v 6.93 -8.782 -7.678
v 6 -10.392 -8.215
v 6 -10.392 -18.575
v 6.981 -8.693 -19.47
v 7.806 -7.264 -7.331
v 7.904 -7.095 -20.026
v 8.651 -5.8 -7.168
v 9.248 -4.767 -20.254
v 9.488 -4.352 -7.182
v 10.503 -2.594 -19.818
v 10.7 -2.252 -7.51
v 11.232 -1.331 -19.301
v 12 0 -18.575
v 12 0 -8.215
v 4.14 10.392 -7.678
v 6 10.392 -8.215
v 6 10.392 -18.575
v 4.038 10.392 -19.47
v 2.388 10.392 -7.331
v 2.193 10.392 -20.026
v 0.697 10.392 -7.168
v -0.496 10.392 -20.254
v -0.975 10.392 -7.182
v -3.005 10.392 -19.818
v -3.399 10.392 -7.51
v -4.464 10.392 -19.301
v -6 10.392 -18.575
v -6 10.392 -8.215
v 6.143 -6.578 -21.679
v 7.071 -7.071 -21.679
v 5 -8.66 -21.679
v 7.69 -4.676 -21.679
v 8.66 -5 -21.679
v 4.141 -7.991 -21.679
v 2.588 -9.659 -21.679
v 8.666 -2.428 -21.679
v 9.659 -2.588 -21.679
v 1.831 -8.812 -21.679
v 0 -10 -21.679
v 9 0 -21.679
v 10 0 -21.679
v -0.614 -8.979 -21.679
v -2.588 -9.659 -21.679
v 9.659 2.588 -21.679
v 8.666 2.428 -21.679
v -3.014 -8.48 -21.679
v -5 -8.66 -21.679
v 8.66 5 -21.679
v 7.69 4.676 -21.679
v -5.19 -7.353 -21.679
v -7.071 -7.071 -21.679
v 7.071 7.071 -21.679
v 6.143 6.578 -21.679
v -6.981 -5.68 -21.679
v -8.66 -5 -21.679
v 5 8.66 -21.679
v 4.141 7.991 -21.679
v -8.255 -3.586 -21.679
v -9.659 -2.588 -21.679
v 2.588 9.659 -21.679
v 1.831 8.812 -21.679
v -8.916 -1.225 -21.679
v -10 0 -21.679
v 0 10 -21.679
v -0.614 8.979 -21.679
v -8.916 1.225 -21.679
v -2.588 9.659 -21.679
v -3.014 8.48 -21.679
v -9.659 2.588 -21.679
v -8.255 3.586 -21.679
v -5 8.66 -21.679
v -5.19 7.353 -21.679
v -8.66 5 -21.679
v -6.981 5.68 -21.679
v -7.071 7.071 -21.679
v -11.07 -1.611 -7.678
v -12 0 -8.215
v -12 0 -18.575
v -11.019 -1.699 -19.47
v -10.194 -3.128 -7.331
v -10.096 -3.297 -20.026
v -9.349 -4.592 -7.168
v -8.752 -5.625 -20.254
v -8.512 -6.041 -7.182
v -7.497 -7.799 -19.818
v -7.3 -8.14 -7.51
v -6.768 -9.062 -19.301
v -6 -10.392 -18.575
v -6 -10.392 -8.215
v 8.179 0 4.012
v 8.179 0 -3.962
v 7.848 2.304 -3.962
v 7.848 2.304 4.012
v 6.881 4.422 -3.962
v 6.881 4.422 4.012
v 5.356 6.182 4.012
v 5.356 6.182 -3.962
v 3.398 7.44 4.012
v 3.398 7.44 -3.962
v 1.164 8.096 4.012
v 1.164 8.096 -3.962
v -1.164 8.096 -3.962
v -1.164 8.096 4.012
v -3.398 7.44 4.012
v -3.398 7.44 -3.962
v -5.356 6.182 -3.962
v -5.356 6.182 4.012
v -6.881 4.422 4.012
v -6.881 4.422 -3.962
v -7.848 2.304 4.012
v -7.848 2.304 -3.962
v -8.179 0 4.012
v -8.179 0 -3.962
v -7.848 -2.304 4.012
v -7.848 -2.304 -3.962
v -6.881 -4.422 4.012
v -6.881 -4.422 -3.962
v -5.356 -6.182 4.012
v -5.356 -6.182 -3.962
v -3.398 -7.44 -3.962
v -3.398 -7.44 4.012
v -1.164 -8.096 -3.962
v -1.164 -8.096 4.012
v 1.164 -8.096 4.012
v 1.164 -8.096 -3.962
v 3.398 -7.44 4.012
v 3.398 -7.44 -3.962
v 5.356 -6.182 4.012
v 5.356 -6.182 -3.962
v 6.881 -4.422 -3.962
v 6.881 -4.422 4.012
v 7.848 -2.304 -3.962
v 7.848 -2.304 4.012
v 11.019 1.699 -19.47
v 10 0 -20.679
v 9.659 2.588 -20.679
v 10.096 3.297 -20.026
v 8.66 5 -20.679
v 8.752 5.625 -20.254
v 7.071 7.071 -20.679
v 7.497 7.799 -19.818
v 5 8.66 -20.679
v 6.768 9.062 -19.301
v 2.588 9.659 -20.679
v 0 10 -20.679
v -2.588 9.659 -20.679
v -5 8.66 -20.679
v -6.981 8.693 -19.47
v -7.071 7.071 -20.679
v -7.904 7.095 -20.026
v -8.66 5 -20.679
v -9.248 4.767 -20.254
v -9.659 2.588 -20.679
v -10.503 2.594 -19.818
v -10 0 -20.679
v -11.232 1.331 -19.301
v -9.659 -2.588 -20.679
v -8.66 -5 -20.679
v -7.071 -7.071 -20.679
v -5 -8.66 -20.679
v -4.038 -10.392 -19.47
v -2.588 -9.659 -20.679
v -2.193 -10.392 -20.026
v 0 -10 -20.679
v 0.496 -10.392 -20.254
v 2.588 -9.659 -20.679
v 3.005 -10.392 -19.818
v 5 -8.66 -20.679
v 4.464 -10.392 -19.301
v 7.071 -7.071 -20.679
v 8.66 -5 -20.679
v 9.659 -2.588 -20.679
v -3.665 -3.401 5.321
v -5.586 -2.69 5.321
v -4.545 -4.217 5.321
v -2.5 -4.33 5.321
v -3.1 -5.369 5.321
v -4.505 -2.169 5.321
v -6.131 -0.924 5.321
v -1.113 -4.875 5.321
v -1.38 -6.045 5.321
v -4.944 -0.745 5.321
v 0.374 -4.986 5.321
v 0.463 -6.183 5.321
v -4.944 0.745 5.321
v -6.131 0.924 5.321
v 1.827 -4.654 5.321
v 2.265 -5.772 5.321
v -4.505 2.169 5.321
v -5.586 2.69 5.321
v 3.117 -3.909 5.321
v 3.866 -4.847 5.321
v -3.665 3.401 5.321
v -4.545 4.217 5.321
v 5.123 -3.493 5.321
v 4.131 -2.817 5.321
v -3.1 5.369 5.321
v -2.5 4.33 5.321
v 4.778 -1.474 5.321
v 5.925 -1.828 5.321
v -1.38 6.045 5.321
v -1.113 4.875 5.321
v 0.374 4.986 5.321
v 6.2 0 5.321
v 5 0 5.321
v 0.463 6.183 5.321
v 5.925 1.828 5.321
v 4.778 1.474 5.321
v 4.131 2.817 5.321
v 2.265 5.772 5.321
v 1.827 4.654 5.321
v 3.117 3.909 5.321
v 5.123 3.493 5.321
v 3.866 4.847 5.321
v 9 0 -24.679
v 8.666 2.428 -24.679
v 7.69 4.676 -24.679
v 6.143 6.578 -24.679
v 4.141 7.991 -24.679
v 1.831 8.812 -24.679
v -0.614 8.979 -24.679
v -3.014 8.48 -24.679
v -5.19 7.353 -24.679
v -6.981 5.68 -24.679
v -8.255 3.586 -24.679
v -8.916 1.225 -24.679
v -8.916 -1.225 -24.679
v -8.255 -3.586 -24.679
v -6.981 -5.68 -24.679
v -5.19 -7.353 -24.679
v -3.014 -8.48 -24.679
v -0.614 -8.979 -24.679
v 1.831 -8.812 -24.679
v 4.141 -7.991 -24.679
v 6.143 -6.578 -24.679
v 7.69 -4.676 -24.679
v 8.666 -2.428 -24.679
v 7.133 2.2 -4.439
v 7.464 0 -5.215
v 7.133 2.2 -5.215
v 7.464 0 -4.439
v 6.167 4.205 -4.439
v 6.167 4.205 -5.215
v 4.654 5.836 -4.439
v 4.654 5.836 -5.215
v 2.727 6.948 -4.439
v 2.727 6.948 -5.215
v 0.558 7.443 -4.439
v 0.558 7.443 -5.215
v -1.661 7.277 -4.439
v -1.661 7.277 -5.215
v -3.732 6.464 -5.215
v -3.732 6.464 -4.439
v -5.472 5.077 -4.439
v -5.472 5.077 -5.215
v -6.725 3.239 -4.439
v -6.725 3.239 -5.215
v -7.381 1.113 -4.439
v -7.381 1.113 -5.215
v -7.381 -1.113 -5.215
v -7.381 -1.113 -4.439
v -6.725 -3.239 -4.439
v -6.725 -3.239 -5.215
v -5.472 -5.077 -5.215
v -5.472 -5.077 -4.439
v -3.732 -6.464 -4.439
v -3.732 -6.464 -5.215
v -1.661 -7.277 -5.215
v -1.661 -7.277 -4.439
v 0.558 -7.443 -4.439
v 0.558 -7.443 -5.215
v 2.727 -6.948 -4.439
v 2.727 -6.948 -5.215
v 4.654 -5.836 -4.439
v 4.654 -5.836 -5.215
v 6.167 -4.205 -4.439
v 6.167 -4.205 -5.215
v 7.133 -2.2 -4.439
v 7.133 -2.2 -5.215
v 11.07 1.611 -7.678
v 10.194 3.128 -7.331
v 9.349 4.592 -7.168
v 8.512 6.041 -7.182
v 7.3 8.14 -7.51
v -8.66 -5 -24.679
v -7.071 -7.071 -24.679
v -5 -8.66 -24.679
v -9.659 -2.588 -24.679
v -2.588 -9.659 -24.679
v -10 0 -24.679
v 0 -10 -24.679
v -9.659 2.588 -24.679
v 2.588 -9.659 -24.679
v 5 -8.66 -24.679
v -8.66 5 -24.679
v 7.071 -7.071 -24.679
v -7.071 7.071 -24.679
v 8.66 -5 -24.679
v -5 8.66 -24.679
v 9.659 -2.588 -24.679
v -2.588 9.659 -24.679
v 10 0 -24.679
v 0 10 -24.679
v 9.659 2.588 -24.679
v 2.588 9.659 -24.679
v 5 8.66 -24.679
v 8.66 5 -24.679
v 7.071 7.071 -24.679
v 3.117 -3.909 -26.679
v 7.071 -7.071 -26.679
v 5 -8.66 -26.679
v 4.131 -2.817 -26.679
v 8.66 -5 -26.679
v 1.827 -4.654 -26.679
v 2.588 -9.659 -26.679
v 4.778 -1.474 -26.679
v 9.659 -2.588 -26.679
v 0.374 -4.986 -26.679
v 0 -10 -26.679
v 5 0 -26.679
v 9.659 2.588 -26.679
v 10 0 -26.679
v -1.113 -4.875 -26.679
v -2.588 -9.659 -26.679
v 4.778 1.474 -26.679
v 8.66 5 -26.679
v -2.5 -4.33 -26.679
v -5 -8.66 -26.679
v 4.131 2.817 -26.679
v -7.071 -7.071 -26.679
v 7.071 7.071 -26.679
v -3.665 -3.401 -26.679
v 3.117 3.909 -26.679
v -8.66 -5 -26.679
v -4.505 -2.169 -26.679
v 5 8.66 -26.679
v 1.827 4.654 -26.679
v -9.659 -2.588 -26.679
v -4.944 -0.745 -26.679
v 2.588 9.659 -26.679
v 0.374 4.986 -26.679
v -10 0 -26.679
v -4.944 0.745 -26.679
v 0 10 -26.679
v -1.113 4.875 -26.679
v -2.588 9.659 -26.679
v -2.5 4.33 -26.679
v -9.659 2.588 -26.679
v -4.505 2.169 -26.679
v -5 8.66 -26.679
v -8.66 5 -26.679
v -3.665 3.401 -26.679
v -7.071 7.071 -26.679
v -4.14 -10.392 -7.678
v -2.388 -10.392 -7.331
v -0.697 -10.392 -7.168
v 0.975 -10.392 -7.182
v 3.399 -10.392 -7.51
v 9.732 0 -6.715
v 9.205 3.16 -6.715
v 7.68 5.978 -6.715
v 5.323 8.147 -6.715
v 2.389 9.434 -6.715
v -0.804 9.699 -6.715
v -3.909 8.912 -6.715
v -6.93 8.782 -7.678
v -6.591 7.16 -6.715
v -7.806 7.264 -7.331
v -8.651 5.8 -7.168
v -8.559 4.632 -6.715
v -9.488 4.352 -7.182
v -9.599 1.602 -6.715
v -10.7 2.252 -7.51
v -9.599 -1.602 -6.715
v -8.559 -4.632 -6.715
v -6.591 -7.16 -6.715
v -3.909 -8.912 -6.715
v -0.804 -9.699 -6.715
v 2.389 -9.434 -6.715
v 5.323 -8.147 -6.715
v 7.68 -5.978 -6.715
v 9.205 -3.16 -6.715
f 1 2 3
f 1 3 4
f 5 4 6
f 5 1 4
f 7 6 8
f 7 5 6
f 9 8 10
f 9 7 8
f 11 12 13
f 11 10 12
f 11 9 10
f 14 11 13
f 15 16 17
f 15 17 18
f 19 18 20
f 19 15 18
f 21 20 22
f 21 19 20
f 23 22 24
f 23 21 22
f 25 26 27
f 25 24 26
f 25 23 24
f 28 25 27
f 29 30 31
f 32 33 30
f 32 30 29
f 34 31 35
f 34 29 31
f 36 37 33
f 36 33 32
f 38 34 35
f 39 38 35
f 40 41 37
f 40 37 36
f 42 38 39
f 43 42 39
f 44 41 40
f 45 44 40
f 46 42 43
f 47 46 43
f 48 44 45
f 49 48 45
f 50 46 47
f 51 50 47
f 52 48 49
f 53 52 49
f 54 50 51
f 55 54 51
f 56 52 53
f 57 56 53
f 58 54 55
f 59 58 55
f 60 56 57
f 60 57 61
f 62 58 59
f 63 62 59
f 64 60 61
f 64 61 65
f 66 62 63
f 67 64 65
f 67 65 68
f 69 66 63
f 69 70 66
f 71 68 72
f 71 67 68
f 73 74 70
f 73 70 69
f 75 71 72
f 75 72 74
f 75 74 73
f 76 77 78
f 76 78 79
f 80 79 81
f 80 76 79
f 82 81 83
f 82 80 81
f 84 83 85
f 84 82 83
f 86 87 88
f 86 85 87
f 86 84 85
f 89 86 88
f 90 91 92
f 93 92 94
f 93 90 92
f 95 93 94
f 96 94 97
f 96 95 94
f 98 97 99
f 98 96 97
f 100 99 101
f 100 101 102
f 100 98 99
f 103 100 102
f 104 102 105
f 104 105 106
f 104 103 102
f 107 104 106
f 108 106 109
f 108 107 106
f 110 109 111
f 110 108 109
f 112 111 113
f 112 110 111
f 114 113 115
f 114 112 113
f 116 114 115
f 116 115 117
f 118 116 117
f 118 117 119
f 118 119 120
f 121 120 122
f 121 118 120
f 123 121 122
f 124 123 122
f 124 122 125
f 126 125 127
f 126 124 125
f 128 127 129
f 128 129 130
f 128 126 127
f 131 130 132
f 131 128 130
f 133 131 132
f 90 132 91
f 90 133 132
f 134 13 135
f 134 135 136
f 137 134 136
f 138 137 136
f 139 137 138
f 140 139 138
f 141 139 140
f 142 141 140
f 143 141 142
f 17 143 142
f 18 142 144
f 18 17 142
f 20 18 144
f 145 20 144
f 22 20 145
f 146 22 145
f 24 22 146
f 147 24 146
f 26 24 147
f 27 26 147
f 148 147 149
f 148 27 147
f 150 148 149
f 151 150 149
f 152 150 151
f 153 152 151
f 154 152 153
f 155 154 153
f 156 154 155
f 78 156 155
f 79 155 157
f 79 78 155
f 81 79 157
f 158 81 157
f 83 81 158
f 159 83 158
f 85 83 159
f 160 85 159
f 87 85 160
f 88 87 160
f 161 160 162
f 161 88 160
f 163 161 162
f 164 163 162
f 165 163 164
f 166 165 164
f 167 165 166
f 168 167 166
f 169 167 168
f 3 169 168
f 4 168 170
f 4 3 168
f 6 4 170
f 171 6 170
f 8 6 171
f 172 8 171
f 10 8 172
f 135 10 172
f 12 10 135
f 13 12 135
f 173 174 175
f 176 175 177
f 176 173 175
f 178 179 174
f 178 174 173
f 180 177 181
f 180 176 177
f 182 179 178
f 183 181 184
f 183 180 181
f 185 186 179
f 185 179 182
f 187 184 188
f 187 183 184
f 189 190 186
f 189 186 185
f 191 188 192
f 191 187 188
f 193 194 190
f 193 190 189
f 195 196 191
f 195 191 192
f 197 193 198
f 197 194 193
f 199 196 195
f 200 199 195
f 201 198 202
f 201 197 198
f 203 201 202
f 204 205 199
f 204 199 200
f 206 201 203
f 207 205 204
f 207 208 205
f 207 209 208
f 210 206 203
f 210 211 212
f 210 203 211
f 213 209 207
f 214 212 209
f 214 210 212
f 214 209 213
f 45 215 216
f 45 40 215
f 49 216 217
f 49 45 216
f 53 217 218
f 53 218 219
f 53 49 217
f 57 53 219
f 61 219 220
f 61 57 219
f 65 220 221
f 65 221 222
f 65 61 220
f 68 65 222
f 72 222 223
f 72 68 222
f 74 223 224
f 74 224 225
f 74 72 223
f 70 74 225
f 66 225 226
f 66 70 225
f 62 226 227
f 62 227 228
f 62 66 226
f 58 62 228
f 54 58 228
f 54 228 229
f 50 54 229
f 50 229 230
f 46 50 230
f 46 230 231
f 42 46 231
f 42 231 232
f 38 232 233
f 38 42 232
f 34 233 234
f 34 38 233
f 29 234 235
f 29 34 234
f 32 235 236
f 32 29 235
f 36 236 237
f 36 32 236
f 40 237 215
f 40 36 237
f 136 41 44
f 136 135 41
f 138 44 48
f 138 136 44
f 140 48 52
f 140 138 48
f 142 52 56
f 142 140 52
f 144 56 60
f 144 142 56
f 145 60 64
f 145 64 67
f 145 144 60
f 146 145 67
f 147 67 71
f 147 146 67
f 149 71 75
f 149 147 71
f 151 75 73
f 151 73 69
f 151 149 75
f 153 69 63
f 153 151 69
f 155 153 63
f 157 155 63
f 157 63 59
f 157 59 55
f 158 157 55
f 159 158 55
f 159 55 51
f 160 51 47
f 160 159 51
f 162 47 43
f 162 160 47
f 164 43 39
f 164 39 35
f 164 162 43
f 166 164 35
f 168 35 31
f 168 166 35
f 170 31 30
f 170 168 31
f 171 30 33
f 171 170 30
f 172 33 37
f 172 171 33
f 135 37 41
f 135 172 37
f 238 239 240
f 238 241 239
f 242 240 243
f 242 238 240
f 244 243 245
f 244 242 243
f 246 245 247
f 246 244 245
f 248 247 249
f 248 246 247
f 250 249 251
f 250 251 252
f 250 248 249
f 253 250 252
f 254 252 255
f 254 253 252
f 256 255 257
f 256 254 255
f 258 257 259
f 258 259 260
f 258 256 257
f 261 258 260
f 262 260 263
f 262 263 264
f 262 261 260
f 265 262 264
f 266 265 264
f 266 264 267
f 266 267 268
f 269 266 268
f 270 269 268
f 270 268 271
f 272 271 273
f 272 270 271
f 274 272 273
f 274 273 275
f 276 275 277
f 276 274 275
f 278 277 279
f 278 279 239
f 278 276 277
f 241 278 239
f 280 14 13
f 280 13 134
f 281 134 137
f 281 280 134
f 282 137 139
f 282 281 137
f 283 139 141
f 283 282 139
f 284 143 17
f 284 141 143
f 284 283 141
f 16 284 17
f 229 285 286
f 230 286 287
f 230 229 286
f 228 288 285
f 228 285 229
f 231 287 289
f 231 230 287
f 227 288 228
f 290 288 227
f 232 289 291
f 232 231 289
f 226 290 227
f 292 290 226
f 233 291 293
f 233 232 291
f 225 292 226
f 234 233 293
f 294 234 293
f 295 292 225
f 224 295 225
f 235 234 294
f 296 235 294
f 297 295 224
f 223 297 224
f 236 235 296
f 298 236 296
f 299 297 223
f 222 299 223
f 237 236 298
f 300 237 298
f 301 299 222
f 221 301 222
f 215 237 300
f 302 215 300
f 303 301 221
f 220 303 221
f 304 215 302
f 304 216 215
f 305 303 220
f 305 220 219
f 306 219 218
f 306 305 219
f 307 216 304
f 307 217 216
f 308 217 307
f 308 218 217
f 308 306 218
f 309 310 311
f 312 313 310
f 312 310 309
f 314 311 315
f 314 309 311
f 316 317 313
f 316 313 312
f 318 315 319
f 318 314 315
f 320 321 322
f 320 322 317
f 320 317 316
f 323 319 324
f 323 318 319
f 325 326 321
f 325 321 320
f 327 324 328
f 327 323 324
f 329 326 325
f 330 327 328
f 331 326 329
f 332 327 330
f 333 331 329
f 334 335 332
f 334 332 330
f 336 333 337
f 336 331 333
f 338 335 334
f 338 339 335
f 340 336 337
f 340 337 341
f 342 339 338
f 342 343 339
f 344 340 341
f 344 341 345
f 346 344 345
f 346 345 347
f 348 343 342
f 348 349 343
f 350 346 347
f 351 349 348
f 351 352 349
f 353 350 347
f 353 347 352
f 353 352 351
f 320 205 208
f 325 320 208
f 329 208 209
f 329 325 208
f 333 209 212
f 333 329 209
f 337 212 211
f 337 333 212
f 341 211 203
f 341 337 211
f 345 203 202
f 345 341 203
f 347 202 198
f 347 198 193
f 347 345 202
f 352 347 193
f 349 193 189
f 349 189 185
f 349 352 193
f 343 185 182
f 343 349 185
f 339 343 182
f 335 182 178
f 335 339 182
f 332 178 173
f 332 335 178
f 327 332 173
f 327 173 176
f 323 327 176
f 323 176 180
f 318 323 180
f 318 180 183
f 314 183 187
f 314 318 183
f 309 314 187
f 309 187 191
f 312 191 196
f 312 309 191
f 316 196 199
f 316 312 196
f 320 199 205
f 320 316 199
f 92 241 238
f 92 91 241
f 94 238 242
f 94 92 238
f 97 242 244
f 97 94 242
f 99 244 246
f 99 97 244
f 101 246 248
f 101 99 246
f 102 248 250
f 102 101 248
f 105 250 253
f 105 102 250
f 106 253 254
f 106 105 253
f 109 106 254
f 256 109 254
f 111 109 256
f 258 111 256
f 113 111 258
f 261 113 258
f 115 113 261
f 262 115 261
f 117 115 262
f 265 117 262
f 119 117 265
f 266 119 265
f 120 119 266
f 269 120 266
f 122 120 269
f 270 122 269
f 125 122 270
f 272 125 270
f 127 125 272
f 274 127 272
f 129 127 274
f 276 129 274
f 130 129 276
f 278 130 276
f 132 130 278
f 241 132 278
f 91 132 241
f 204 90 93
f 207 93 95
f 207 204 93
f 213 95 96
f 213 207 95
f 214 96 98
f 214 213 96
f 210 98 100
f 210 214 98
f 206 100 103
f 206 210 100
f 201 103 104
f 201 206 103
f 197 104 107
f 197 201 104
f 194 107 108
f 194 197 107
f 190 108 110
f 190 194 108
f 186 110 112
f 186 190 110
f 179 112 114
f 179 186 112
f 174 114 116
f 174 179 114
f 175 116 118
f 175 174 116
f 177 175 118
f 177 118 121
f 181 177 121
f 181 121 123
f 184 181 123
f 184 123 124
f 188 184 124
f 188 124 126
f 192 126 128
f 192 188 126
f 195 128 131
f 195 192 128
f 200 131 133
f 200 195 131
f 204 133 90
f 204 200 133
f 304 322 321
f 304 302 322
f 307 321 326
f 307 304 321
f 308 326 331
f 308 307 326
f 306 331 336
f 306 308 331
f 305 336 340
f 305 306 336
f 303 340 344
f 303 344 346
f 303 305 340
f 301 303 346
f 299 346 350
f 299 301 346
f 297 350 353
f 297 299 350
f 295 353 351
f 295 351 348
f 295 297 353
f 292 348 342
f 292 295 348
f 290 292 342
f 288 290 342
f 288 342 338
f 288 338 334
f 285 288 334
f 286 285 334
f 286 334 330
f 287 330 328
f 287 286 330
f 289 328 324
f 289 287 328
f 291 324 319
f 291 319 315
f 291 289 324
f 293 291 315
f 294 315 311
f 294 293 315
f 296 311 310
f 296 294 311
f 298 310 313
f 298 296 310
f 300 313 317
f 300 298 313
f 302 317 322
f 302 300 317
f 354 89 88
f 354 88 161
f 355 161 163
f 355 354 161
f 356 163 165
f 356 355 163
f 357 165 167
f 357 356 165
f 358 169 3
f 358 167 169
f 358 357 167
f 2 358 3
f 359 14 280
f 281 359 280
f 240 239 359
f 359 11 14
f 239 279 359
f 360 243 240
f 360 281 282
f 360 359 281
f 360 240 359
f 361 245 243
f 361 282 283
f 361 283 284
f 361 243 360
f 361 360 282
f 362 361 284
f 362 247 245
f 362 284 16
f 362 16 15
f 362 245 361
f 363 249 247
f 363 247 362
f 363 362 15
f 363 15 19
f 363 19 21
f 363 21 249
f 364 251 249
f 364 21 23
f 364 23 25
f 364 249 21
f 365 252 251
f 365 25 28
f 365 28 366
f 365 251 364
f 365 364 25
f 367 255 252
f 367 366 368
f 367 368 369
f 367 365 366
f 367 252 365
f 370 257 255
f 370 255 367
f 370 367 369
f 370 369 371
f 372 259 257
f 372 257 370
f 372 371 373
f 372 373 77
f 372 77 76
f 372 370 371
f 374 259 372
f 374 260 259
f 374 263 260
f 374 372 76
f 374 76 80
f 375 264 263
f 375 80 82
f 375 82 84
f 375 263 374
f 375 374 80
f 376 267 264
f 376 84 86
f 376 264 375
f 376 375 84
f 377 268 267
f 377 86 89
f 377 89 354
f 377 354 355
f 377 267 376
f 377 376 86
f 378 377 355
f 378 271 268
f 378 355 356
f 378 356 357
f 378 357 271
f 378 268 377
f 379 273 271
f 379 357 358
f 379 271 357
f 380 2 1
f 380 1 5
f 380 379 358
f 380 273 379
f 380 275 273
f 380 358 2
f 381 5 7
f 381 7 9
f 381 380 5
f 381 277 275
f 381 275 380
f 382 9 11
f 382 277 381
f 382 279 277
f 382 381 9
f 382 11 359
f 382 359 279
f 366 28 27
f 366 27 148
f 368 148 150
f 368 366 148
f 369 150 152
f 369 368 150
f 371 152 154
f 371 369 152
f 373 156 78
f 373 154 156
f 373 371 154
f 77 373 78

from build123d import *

# Parameters (mm, degrees)
CROQUIS2_OUTSIDE_W    = 35.33
CROQUIS2_OUTSIDE_H    = 35.33
CORTAR_EXTRUIR2_DEPTH = 40


with BuildPart() as part:
    # Croquis1 → Revolución1 (revolve)
    with BuildSketch(Plane(origin=(0, 0, 0), x_dir=(1, 0, 0), z_dir=(0, 1, 0))):
        Polygon((5, 26.679286354), (10, 26.679286354), (10, 24.679286354), (9, 24.679286354), (9, 21.679286354), (10, 21.679286354), (10, 20.679286354), (12, 18.574849316), (12, 8.21549426), (7.464345365, 5.21549426), (7.464345365, 4.439385), (8.179362134, 3.961906928), (8.179362134, -4.011582493), (6.20010654, -5.320713646), (5, -5.320713646), align=None)
    revolve(axis=Axis((0, 0, -34.95637535), (0, 0, 1)))

    # Croquis2 outside → Cortar-Extruir2 (cut)
    with BuildSketch(Plane.XY):
        Rectangle(CROQUIS2_OUTSIDE_W, CROQUIS2_OUTSIDE_H)
        Polygon((12, 0), (6, 10.392304845), (-6, 10.392304845), (-12, 0), (-6, -10.392304845), (6, -10.392304845), align=None, mode=Mode.SUBTRACT)
    extrude(amount=-CORTAR_EXTRUIR2_DEPTH, mode=Mode.SUBTRACT)


solid = part.part
